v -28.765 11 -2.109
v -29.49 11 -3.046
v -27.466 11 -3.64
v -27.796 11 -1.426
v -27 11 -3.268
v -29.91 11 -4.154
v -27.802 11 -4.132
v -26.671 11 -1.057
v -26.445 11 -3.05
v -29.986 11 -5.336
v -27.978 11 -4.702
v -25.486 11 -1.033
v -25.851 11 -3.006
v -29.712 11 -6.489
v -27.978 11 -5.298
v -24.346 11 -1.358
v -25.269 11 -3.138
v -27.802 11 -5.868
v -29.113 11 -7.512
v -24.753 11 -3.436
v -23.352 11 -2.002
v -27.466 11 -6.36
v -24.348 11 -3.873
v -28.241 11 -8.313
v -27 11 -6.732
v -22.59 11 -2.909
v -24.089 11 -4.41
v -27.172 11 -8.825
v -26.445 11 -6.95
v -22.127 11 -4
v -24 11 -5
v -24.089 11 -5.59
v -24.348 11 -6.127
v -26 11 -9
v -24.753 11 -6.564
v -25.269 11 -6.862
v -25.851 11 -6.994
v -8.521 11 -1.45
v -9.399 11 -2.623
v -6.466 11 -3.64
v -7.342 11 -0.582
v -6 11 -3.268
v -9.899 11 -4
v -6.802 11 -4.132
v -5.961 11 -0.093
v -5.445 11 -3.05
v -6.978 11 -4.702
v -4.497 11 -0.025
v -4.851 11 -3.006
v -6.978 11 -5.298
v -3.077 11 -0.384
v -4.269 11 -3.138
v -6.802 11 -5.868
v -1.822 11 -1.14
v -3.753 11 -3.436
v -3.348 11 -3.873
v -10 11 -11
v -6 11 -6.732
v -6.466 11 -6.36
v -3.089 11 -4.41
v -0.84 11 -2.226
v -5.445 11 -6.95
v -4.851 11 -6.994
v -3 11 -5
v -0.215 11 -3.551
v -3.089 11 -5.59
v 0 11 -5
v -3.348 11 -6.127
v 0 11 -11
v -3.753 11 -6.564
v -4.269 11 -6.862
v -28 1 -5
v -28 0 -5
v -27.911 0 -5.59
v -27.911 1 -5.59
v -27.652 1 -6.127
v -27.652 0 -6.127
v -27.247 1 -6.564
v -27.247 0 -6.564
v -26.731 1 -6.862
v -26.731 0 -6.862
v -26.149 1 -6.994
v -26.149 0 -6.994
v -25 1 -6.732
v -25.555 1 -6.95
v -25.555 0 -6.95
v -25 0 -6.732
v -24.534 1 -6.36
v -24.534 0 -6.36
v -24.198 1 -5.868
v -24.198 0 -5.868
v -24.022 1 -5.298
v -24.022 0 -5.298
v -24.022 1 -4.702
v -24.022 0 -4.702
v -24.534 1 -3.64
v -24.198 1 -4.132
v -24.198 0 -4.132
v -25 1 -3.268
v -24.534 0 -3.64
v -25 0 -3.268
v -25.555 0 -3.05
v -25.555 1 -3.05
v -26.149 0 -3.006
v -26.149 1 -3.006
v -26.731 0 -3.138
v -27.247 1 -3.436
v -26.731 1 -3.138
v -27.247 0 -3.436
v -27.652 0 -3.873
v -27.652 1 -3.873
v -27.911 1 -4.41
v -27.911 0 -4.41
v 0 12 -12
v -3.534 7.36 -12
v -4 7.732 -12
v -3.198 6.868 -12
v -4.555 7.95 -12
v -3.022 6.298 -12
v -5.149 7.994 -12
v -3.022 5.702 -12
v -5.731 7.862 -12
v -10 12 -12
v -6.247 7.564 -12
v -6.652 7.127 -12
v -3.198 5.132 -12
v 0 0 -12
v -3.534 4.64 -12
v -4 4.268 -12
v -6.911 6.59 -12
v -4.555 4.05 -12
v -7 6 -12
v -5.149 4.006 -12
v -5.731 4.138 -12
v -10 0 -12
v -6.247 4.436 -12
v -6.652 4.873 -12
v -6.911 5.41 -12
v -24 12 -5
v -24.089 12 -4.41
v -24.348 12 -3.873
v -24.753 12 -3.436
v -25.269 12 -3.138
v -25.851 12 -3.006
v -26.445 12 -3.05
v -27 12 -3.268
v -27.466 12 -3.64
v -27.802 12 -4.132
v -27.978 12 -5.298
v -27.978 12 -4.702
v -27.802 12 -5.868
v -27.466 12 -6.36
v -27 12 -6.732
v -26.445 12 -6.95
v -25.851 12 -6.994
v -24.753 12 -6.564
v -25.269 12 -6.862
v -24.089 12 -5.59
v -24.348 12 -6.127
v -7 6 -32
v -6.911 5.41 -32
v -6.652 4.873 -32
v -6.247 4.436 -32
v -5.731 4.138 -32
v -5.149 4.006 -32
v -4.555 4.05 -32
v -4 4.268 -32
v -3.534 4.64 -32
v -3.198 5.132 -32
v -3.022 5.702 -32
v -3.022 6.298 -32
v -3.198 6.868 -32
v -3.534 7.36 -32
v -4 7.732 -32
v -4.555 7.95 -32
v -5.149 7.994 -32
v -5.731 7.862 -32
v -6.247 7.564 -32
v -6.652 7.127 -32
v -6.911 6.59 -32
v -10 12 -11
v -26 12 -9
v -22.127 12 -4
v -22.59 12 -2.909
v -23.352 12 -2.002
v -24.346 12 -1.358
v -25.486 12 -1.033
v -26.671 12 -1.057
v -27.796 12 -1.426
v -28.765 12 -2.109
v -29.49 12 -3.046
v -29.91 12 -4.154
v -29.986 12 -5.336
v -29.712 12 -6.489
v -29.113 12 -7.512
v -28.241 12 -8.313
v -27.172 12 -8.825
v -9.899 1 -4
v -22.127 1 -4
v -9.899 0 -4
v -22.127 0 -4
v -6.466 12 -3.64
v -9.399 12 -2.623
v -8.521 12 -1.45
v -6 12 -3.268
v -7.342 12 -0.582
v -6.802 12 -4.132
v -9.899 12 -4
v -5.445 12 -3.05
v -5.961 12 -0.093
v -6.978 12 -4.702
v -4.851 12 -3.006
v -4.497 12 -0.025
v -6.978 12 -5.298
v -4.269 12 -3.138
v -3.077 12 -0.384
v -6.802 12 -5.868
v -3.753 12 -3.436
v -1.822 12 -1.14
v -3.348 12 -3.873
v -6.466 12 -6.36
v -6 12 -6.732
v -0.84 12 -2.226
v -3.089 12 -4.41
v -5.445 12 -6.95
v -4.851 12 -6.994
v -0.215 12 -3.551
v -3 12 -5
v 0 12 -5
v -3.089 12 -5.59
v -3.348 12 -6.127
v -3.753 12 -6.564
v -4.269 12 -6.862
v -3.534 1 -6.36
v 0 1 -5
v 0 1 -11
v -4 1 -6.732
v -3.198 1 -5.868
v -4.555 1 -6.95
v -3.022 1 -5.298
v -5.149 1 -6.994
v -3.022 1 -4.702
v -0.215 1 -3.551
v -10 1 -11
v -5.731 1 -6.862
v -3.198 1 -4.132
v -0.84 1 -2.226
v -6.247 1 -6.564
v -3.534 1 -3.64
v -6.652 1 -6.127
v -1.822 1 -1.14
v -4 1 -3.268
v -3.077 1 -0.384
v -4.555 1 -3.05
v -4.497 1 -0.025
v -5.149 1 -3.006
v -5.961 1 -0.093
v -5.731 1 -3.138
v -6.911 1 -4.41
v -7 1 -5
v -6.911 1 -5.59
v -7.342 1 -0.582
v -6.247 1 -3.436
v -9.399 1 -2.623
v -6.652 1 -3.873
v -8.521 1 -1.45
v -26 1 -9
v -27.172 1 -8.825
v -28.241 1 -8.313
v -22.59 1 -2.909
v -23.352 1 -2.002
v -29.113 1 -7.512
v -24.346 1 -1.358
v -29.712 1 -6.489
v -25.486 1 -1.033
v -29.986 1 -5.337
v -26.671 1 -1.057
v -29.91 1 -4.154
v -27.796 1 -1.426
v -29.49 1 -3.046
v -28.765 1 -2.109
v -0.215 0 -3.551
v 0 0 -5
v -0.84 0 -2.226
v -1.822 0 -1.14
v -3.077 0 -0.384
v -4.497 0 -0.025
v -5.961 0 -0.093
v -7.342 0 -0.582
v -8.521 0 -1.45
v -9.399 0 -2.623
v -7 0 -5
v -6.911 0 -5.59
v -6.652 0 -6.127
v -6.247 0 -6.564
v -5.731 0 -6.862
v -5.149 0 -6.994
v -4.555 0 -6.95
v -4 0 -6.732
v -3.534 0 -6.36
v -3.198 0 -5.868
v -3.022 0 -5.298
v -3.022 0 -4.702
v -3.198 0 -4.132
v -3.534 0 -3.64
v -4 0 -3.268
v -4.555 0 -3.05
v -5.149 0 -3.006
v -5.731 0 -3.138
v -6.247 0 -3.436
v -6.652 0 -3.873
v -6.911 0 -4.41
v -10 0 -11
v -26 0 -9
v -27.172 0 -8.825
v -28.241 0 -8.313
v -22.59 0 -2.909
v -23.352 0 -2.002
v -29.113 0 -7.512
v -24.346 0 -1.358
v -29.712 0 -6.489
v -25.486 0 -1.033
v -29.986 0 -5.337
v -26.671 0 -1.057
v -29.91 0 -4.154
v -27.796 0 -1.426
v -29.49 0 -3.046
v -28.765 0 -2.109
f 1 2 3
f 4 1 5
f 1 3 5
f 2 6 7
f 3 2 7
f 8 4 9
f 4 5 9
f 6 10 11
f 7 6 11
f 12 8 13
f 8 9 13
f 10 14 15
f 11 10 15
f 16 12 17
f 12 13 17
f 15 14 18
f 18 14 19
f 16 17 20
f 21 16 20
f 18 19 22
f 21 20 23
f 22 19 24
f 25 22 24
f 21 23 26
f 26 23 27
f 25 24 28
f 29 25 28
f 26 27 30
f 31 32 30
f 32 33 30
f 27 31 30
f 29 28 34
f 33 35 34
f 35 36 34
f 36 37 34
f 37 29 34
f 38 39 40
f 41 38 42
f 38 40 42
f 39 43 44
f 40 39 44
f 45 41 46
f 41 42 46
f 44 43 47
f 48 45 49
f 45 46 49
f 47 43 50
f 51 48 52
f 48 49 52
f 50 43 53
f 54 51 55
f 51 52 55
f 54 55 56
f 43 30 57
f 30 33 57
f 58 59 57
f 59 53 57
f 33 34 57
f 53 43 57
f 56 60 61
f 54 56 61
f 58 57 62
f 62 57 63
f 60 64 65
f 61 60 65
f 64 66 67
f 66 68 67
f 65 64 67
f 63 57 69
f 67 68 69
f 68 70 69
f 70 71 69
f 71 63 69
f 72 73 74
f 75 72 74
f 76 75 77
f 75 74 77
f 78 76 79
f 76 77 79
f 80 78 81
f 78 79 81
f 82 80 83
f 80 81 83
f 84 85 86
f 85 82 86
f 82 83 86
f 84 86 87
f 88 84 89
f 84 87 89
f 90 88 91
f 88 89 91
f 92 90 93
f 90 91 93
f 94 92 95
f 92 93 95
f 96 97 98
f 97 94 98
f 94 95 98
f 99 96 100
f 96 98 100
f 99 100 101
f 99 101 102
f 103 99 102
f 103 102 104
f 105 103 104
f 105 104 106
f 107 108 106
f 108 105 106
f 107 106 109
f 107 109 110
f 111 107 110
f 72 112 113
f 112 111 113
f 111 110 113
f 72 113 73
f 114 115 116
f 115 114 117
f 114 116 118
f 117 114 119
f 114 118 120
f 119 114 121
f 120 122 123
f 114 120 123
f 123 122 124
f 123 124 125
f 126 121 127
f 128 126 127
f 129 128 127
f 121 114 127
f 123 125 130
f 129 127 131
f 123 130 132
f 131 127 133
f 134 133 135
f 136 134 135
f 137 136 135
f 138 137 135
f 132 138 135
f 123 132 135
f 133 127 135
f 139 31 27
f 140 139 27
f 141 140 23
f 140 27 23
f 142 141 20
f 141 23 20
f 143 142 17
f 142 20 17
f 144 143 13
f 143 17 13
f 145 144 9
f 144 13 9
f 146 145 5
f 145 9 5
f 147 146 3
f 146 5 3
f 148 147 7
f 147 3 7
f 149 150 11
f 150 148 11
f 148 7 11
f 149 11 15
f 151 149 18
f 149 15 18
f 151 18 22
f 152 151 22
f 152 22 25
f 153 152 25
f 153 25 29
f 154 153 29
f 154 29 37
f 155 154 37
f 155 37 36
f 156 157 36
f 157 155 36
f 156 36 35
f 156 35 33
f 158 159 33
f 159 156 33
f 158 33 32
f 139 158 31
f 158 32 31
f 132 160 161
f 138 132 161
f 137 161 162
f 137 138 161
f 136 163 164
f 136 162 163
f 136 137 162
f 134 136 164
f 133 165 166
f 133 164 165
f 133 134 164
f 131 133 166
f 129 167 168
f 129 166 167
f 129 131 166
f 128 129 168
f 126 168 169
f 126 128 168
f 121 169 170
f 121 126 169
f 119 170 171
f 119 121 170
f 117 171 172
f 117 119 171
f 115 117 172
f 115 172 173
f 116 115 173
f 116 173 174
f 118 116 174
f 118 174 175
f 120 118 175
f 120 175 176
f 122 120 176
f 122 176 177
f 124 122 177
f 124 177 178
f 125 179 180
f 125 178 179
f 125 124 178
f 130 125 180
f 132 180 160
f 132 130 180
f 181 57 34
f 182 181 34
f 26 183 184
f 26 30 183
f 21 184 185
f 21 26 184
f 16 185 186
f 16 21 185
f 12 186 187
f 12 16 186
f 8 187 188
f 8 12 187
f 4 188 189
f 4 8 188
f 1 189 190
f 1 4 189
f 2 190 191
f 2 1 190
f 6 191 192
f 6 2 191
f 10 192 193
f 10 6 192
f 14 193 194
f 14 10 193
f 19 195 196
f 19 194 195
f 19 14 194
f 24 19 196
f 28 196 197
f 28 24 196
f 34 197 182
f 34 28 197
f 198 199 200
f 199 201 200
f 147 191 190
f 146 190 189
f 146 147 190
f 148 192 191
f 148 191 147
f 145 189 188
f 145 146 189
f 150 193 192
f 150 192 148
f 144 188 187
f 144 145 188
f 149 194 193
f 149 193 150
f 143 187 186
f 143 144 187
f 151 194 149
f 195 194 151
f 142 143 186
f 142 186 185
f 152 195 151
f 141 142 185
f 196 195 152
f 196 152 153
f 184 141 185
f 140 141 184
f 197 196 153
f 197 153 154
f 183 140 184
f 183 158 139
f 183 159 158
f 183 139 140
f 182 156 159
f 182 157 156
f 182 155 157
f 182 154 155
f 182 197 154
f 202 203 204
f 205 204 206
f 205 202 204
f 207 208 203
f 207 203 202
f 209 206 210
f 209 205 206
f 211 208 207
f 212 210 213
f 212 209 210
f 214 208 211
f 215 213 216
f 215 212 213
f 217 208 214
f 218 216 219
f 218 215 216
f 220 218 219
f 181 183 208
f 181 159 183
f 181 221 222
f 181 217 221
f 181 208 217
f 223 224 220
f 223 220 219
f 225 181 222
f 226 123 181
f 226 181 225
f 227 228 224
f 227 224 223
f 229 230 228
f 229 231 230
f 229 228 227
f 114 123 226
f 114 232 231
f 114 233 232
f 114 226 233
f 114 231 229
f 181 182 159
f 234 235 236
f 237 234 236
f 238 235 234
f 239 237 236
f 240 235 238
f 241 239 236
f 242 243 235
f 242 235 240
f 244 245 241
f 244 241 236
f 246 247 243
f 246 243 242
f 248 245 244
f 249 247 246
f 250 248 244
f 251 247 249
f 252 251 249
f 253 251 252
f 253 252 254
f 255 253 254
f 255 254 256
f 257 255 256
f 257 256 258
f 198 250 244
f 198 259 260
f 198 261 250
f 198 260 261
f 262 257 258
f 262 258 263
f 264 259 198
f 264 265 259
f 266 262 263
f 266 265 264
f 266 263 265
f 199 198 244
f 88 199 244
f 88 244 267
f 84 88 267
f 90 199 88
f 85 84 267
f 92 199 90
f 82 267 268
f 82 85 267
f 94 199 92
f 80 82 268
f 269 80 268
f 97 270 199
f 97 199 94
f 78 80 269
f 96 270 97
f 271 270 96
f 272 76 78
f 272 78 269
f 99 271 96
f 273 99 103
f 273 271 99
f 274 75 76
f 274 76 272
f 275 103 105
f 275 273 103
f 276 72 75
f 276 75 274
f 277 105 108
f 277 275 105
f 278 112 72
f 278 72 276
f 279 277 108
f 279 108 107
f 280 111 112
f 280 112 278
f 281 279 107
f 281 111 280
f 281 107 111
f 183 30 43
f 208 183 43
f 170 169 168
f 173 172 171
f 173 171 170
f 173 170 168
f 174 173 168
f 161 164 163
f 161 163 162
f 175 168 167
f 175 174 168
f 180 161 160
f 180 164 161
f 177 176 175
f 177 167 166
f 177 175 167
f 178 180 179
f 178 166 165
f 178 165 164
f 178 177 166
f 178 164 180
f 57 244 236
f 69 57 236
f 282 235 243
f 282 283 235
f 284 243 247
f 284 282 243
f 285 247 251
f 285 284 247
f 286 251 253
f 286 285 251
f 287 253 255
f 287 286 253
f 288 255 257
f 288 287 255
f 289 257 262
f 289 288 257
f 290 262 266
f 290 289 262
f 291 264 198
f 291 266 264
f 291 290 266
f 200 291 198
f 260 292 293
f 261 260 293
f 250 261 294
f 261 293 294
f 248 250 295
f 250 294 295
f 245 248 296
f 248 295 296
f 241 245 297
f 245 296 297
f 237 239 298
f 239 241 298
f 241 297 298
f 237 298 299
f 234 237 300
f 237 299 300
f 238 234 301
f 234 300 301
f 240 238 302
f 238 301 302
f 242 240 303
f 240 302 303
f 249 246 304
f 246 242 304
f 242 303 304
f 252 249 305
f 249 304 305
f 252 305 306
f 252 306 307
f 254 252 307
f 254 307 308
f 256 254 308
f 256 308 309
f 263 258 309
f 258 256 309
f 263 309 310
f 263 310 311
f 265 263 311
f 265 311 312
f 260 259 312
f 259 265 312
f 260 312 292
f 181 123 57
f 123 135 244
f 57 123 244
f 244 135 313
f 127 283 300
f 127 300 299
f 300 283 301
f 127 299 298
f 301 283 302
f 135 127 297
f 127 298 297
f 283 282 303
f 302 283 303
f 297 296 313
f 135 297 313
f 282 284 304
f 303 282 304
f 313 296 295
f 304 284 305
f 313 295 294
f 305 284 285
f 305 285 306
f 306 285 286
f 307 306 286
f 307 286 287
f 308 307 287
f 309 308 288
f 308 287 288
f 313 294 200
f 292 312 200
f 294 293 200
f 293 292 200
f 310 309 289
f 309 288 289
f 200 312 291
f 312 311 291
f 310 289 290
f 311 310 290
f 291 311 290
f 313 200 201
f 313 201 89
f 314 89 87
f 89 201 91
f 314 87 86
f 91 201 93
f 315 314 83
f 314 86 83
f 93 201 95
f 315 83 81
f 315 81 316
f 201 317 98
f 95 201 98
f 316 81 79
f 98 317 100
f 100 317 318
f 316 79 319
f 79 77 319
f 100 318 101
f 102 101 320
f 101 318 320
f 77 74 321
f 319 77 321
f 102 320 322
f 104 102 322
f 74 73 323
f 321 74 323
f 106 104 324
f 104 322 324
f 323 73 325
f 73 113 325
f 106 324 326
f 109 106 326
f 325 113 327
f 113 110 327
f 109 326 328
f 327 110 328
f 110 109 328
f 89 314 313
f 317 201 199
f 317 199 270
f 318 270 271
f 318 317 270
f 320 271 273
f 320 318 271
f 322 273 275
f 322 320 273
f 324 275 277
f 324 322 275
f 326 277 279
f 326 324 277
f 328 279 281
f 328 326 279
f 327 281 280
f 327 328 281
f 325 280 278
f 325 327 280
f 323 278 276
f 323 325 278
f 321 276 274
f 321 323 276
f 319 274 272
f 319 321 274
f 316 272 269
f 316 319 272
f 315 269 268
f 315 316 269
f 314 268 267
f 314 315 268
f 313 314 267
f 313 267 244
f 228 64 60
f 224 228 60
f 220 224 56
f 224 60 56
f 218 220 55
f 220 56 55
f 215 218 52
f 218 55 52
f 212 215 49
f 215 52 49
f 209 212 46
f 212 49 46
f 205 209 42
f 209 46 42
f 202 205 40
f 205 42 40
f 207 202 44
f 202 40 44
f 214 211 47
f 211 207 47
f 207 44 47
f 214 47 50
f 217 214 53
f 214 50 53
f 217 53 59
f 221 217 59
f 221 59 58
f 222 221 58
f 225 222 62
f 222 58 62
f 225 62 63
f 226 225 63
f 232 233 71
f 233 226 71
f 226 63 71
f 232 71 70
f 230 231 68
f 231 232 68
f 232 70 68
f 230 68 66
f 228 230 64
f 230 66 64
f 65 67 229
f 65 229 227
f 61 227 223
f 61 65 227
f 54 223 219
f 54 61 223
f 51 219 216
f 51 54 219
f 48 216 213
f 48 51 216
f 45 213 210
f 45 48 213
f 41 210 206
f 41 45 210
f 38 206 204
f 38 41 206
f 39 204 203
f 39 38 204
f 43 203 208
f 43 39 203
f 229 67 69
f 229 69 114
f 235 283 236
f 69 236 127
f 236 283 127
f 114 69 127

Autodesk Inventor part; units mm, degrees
ref_plane "YZ Plane" through (0, 0, 0) normal (1, 0, 0) x (0, 1, 0)
ref_plane "XZ Plane" through (0, 0, 0) normal (0, 1, 0) x (-1, 0, 0)
ref_plane "XY Plane" through (0, 0, 0) normal (0, 0, 1) x (1, 0, 0)
sketch "Sketch1" plane through (0, 0, 0) normal (0, 1, 0) x (-1, 0, 0)
  line L0 (0, -12) -> (10, -12)
  line L1 (10, -12) -> (10, -5)
  line L2 (0, -5) -> (0, -12)
  arc A0 (10, -5) -> (0, -5) centre (5, -5) ccw
  circle A1 centre (5, -5) radius 2
  circle A2 centre (26, -5) radius 2
  line L3 (10, -4) -> (22, -4)
  line L4 (10, -12) -> (10, -11)
  line L5 (26, -9) -> (10, -11)
  arc A3 (26, -9) -> (22, -5) centre (26, -5) ccw
  line L6 (10, -4) -> (9.899, -4)
  line L7 (22, -4) -> (22.127, -4)
  point P0 (0, 0)
  point P1 (0, 0)
  point P2 (9.9495, -4)
  point P3 (5, 0)
  dimension "d269" = 4
  dimension "d270" = 12
  dimension "d271" = 1
  dimension "d272" = 4
  dimension "d273" = 4
  dimension "d274" = -1
  dimension "d275" = -1
  dimension "d278" = 7
  dimension "d279" = 10
  dimension "d280" = 5
  dimension "d282" = 4
  dimension "d284" = 5
  dimension "d286" = 5
  dimension "d287" = 4
extrude "Extrusion1" add sketch "Sketch1" along normal blind 1
sketch "Sketch2" plane through (0, 1, 0) normal (0, 1, 0) x (1, 0, 0)
  line L0 (0, 12) -> (-10, 12) projected
  line L1 (0, 12) -> (-10, 12)
  line L2 (-10, 12) -> (-10, 11)
  line L3 (-10, 11) -> (0, 11)
  line L4 (0, 11) -> (0, 12)
  point P0 (0, 0)
  dimension "d288" = 1
extrude "Extrusion2" add sketch "Sketch2" along normal blind 10
sketch "Sketch3" plane through (0, 11, 0) normal (0, 1, 0) x (1, 0, 0)
  line L0 (0, 5) -> (0, 12) projected
  line L1 (0, 12) -> (-10, 12)
  line L2 (-10, 12) -> (-10, 11)
  line L3 (0, 11) -> (0, 12)
  arc A0 (-9.899, 4) -> (0, 5) centre (-5, 5) ccw projected
  line L4 (0, 11) -> (0, 5)
  line L5 (-22.127, 4) -> (-9.899, 4) projected
  arc A1 (-9.899, 4) -> (0, 5) centre (-5, 5) ccw
  arc A2 (-26, 9) -> (-22.127, 4) centre (-26, 5) ccw projected
  line L6 (-9.899, 4) -> (-22.127, 4)
  line L7 (-10, 11) -> (-26, 9) projected
  line L8 (-10, 11) -> (-26, 9)
  circle A3 centre (-5, 5) radius 2
  circle A4 centre (-26, 5) radius 2
  arc A5 (-26, 9) -> (-22.127, 4) centre (-26, 5) ccw
  dimension "d291" = 4
  dimension "d294" = 4
  dimension "d295" = 4
extrude "Extrusion3" add sketch "Sketch3" along normal blind 1
sketch "Sketch4" plane through (0, 0, -12) normal (0, 0, -1) x (-1, 0, 0)
  circle A0 centre (5, 6) radius 2
  line L0 (0, 0) -> (10, 0) projected
  line L1 (0, 0) -> (0, 12) projected
  dimension "d269" = 4
  dimension "d270" = 12
  dimension "d271" = 1
  dimension "d272" = 4
  dimension "d273" = 4
  dimension "d274" = -1
  dimension "d275" = -1
  dimension "d278" = 7
  dimension "d279" = 10
  dimension "d280" = 5
  dimension "d282" = 4
  dimension "d284" = 5
  dimension "d286" = 5
  dimension "d287" = 4
  dimension "d296" = 4
  dimension "d297" = 6
  dimension "d298" = 5
extrude "Extrusion4" add sketch "Sketch4" along normal blind 20
properties part number "Langbektang houder"
